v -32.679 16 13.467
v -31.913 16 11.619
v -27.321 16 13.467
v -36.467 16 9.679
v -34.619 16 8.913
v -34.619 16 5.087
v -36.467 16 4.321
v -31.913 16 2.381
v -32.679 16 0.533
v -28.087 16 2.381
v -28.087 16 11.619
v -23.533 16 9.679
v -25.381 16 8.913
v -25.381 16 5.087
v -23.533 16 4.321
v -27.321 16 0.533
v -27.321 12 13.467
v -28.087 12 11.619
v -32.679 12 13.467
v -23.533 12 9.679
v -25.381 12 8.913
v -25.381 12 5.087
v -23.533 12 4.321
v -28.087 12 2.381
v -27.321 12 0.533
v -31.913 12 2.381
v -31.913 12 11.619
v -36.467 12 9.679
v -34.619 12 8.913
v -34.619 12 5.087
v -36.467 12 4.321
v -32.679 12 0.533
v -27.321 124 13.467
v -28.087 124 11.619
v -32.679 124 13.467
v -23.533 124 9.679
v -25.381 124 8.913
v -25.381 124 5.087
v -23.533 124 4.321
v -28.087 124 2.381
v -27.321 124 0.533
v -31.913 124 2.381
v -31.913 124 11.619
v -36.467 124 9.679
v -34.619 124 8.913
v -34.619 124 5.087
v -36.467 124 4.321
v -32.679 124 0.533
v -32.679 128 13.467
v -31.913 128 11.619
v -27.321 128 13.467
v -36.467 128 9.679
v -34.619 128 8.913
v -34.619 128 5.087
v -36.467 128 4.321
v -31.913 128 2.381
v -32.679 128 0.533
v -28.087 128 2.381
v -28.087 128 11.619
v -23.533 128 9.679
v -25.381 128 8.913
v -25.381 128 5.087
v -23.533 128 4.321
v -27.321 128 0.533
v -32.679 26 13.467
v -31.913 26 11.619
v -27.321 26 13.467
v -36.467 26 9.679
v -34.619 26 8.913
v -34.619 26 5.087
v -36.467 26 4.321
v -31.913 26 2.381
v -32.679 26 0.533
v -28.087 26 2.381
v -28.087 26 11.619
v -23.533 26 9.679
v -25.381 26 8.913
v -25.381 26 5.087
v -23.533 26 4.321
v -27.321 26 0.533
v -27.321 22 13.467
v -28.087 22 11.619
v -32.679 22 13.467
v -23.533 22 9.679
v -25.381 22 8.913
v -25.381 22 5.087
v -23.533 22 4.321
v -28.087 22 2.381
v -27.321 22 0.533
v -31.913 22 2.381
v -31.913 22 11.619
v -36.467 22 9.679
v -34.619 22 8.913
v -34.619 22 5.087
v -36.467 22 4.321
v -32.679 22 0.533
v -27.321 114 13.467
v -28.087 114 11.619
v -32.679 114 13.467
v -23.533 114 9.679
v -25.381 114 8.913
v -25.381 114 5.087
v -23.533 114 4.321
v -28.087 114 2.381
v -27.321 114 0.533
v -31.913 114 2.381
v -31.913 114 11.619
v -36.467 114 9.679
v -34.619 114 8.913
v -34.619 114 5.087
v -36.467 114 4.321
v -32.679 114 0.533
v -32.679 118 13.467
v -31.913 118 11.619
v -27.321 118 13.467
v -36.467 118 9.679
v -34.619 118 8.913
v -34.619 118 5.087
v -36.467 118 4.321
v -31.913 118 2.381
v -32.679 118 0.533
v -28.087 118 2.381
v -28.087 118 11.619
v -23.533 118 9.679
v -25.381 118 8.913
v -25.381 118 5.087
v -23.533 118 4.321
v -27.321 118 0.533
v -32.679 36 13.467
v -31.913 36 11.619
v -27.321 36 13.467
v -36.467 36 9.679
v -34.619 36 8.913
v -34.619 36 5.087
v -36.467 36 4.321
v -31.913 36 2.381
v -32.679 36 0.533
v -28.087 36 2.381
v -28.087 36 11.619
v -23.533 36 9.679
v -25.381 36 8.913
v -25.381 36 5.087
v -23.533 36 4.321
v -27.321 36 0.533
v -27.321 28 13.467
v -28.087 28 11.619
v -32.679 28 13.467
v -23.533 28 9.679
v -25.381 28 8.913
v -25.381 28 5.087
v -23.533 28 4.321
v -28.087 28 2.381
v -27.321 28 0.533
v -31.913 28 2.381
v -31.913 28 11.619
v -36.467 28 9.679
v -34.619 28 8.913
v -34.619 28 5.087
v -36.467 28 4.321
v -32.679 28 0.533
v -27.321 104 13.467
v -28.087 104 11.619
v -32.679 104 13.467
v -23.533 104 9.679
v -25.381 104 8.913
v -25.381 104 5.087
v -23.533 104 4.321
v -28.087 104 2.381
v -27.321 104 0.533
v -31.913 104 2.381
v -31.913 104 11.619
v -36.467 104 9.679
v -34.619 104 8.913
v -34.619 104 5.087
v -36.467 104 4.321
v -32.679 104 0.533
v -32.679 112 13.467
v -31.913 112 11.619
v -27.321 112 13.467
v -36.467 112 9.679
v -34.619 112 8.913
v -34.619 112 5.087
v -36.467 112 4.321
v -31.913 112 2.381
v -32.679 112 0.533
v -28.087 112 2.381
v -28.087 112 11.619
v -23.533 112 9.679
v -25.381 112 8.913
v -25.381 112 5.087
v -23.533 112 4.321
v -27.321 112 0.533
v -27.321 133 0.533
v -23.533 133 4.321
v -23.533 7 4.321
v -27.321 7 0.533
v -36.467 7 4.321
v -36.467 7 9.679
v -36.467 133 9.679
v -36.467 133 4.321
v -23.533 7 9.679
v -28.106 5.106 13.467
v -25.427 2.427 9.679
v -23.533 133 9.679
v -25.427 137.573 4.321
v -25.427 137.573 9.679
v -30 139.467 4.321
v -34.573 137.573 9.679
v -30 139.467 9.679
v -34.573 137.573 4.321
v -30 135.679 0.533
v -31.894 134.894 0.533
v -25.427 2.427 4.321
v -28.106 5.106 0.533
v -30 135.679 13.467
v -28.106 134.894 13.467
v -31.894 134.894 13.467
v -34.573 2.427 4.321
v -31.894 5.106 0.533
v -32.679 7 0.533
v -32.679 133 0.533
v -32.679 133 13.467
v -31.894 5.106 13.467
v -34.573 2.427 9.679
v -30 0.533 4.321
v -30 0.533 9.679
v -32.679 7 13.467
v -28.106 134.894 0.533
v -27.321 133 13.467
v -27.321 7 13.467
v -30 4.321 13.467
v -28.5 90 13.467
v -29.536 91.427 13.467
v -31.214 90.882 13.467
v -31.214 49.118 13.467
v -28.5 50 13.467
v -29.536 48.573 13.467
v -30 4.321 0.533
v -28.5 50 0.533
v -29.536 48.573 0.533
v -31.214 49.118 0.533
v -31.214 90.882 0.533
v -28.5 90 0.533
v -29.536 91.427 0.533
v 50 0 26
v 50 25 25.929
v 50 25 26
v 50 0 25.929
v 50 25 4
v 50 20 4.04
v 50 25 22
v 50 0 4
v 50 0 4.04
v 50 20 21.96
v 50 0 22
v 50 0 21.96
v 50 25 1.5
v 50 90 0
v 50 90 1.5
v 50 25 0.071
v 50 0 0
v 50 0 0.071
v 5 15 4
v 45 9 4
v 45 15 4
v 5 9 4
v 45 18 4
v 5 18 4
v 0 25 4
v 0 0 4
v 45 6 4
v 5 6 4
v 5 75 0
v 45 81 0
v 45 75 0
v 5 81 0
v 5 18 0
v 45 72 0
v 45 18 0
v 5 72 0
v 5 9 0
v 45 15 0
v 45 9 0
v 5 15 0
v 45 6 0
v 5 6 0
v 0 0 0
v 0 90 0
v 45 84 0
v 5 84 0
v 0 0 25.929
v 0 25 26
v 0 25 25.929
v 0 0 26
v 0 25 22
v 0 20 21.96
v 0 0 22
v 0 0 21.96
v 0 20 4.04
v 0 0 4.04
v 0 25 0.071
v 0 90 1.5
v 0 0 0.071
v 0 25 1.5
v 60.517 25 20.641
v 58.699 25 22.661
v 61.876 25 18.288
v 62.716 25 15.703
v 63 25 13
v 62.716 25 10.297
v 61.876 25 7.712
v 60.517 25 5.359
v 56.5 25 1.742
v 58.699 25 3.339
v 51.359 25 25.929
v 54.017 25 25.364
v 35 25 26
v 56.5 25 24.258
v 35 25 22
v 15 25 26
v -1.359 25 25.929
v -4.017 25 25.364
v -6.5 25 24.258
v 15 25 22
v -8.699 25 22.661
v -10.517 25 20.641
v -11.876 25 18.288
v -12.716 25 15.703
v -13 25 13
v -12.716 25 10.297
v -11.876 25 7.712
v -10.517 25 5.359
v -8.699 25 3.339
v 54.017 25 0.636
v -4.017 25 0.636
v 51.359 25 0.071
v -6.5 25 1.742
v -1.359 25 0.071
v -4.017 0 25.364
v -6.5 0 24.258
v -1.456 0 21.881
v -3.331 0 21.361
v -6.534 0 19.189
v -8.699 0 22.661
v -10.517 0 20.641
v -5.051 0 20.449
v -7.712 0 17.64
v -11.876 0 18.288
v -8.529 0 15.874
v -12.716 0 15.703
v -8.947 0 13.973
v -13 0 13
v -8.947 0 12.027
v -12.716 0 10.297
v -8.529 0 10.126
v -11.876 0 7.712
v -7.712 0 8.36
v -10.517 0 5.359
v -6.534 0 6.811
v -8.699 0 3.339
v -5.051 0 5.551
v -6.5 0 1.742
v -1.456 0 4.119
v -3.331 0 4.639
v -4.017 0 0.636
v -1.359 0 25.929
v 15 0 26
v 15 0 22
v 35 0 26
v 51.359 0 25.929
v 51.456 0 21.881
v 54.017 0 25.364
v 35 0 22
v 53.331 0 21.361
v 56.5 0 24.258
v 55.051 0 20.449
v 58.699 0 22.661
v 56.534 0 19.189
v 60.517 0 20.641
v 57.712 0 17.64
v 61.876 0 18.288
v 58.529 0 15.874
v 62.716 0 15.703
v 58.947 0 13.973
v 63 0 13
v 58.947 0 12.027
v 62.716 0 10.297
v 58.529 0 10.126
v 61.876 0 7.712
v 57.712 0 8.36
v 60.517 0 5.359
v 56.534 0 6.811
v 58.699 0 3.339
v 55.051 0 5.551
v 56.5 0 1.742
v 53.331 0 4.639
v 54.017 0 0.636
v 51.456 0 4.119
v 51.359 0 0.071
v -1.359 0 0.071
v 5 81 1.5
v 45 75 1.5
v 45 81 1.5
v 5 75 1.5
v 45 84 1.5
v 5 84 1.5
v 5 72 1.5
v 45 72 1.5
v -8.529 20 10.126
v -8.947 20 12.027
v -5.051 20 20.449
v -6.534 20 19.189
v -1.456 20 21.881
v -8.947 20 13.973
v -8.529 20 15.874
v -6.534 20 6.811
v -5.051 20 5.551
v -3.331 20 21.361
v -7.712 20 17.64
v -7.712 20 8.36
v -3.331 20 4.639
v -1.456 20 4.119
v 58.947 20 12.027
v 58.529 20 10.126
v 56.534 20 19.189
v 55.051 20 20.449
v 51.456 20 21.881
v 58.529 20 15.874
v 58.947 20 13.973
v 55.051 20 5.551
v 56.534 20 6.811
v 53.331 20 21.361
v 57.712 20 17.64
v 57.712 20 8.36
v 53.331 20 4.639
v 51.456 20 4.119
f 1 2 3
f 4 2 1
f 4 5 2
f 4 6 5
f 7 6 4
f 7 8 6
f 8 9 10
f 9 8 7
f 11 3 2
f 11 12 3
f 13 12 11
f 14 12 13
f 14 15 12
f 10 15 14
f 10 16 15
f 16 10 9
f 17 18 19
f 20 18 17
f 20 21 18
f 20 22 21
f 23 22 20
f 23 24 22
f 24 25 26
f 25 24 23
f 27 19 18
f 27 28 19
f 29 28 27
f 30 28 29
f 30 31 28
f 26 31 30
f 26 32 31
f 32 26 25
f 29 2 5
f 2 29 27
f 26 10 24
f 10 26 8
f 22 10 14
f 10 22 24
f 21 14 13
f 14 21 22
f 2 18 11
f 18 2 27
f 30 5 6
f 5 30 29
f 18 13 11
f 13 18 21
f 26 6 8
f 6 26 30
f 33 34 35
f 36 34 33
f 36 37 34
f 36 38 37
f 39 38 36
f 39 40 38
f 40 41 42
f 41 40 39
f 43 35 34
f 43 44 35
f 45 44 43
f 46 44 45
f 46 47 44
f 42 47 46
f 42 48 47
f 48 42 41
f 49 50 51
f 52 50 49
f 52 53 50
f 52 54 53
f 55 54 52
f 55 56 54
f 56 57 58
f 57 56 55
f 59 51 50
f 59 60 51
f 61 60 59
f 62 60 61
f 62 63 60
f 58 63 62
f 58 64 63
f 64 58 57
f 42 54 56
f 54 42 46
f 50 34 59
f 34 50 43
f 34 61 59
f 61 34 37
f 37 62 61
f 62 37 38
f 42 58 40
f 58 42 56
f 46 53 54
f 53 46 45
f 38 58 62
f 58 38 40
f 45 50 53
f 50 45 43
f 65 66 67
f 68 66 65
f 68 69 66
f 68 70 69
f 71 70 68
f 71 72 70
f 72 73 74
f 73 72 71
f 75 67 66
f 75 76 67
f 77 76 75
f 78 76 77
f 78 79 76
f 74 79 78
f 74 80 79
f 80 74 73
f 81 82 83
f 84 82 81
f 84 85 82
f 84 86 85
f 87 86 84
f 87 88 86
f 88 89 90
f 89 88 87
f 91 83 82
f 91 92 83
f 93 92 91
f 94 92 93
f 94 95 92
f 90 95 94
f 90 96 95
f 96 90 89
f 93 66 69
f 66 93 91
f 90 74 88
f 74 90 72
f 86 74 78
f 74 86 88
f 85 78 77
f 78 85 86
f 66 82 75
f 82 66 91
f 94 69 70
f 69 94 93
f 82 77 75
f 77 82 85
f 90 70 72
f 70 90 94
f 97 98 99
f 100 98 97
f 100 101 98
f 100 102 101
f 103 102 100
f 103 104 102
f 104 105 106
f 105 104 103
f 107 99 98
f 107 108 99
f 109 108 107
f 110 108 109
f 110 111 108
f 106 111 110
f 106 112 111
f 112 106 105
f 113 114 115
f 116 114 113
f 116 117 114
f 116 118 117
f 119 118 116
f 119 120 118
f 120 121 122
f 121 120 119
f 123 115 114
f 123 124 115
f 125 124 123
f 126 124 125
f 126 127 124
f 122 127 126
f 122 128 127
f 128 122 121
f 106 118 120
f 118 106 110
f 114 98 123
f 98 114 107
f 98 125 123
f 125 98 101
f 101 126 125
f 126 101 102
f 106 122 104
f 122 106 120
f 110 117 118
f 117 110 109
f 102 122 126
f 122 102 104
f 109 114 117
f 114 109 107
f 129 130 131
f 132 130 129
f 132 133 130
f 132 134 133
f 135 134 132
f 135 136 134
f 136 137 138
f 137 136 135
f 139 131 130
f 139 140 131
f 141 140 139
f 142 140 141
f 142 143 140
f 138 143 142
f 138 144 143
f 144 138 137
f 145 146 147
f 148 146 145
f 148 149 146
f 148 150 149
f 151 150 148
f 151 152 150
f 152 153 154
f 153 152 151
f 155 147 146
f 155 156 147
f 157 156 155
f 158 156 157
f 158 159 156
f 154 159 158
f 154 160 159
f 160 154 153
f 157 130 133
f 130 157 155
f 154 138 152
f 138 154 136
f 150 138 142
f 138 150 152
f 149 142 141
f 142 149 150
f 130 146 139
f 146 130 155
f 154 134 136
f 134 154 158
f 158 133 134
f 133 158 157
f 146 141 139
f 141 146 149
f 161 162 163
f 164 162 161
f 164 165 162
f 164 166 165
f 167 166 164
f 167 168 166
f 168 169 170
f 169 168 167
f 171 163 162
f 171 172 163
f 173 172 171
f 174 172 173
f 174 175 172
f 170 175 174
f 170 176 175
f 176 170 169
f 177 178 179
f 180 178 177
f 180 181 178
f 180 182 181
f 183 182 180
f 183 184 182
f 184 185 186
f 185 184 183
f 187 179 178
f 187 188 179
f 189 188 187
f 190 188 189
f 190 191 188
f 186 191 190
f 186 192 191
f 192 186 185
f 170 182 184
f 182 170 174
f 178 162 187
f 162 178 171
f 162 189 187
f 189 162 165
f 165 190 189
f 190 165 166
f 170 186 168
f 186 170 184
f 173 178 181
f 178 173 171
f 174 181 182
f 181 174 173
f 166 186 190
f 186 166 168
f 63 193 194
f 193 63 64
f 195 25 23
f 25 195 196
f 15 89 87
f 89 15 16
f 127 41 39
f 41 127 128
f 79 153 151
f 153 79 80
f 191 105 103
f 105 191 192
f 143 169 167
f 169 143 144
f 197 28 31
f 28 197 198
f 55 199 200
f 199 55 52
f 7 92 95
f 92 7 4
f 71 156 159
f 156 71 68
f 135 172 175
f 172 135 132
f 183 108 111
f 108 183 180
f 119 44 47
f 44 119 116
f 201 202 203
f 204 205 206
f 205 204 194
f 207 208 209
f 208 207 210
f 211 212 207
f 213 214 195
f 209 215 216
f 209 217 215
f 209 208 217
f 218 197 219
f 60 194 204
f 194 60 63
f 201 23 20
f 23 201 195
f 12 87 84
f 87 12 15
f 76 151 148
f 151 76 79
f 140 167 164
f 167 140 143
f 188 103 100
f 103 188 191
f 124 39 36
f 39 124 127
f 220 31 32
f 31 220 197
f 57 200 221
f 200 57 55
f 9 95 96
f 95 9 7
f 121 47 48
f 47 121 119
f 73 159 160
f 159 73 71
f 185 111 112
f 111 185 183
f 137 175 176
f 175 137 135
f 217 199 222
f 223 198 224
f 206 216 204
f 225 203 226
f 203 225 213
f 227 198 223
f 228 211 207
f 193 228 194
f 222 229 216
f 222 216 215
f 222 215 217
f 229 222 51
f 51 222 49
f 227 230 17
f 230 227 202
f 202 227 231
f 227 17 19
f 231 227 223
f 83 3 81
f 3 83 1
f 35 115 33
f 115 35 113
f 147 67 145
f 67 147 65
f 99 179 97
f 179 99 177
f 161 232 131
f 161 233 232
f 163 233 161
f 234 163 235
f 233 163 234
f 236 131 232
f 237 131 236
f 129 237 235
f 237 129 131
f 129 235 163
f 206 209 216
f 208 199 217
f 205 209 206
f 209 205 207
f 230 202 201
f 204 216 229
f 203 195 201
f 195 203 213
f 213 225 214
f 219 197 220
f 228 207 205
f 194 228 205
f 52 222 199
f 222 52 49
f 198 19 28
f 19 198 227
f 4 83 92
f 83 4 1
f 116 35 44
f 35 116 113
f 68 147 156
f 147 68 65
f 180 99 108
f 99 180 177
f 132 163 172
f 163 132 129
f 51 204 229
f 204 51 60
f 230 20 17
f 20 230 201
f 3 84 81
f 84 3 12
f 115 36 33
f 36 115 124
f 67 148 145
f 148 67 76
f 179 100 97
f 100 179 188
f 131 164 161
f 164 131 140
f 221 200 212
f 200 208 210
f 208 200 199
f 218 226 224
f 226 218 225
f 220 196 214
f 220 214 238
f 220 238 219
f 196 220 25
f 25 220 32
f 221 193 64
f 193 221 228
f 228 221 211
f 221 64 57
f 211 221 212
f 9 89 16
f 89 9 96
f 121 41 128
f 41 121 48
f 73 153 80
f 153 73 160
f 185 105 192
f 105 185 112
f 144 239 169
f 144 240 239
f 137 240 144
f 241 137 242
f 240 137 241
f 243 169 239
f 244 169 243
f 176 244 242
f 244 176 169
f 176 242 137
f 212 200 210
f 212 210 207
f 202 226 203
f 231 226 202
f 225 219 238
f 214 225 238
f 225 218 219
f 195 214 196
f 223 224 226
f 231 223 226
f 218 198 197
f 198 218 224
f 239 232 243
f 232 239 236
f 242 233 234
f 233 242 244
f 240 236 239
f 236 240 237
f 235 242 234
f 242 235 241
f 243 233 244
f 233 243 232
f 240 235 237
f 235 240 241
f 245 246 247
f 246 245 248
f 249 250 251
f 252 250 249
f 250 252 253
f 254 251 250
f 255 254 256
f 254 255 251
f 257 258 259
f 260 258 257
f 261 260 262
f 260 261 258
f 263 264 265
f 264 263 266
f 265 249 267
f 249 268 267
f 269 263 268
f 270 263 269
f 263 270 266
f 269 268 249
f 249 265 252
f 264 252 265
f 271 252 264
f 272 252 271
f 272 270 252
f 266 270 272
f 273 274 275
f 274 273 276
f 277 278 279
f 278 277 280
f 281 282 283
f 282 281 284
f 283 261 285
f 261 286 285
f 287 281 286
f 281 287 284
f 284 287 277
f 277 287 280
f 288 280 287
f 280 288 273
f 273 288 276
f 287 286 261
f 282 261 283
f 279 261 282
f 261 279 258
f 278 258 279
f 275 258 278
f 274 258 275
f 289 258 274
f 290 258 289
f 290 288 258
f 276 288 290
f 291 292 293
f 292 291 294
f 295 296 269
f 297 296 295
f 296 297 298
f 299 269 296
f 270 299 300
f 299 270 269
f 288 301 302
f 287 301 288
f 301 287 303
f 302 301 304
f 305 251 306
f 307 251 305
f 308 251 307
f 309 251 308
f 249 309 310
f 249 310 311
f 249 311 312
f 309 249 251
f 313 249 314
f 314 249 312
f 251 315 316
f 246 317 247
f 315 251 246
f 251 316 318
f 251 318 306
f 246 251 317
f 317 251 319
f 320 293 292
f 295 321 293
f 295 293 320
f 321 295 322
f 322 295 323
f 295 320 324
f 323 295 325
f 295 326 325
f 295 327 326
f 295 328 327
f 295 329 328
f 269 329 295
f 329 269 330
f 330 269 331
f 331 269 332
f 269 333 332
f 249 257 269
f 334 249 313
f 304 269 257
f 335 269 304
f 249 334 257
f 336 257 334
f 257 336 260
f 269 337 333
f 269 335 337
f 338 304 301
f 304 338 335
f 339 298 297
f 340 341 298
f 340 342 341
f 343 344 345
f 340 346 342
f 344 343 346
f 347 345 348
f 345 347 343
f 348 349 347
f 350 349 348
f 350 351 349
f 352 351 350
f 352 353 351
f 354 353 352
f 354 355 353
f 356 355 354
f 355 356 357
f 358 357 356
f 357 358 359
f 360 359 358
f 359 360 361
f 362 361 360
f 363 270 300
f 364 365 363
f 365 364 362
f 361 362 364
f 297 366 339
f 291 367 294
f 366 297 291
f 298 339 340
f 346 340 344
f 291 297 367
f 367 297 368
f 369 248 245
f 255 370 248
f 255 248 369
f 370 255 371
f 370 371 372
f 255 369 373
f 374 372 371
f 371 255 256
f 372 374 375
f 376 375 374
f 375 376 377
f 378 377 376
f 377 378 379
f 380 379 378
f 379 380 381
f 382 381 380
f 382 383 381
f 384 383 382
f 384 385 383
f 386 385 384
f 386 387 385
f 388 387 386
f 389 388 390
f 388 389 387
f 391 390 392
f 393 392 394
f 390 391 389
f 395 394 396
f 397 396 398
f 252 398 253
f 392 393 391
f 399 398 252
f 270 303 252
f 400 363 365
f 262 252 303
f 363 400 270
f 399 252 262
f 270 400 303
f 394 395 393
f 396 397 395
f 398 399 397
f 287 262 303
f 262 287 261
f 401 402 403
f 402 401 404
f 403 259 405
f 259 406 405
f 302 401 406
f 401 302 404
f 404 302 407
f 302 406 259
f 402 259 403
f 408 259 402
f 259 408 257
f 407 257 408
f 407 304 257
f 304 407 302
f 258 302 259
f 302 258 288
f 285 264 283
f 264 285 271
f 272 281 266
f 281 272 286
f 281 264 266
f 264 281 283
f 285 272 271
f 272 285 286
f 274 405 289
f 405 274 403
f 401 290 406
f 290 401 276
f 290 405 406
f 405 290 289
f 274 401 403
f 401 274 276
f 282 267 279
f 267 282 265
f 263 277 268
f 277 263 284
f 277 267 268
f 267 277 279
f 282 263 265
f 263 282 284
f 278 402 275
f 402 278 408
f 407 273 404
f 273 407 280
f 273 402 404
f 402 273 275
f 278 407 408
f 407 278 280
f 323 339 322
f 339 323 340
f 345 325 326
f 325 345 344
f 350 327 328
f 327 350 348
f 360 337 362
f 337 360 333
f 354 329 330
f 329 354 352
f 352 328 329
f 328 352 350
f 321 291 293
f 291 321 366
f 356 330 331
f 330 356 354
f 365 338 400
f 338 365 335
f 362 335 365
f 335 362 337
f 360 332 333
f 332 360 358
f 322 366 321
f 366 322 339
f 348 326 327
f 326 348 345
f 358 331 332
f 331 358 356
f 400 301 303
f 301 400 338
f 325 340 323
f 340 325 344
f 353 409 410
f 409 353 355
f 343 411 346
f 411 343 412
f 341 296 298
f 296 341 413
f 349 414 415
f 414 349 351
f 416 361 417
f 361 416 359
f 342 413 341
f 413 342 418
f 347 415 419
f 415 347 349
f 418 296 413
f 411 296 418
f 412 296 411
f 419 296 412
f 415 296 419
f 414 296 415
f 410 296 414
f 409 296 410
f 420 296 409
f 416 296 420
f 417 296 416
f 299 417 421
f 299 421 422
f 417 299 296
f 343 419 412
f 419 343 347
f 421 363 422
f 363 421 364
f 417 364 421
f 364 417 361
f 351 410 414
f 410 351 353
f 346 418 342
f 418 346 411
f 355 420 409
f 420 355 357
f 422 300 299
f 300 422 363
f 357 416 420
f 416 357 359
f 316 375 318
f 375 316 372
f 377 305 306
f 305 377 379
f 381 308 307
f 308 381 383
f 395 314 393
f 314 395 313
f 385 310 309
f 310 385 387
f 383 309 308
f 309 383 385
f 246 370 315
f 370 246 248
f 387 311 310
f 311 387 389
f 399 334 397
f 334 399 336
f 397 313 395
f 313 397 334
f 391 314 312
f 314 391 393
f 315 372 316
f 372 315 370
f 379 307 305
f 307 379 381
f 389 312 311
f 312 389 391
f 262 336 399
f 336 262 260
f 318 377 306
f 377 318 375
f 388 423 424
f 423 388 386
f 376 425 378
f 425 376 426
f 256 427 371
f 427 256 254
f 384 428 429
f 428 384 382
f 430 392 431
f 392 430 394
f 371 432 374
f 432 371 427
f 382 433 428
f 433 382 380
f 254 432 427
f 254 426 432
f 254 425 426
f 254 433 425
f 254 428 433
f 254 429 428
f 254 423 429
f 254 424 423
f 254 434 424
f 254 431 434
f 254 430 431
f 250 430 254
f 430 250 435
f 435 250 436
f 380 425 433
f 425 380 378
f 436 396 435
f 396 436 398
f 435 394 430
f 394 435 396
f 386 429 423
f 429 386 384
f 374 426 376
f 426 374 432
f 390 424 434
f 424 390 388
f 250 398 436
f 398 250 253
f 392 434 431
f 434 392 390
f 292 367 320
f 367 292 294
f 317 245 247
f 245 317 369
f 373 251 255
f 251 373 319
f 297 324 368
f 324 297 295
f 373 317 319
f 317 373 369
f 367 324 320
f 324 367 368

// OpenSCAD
rod_r=7;//rod radius mm
rod_l=140;//rod length mm
rod_g=5;//rod groove radius
rod_res=8;//rod resolution

rod_groove_l=[4,4,8];//
rod_groove_p=[12,22,28];//

rod_in_strap_space=2;//spacing between rod and the curve
strap_holder_w=50;//strap holder width
strap_holder_t=1.5;//strap holder thickness
strap_holder_l=90;//strap holder length
holder_w=25;//curvy holder width
strap_w=40;// velcro strap width
strap_t=3;//velcro strap groove thickness
curve_sup_t=5;//groove support thichness
curve_t=4;//curve thickness

groov_p_y=[6,15];//y-position of strap grooves 

groov_array_length=2;//length of grooves y-position array 
curve_op=20;//curve upper openning window width 

//calculations
groov_p_x=(strap_holder_w-strap_w)/2;

curve_or=rod_r+rod_in_strap_space+curve_t; //curve outer radius
curve_ir=rod_r+rod_in_strap_space; //curve inner radius
window_y_p=(strap_holder_w-curve_op)/2;//y-position of window






///////////////////////////////////////////
//////////////////////////////////////////

module strap_holder(){
difference(){
union(){
cube([strap_holder_w,holder_w,curve_t]);
cube([strap_holder_w,strap_holder_l,strap_holder_t]);
}
for(i=[0:1:groov_array_length-1]){
translate([groov_p_x,groov_p_y[i],0])cube([strap_w,strap_t,curve_t]);
  translate([groov_p_x,strap_holder_l-strap_t-groov_p_y[i],0])cube([strap_w,strap_t,curve_t]);  
}   

}
//curve building
difference(){
translate([0,0,curve_or])rotate([-90,0,0])difference(){cylinder(r=curve_or,h=holder_w);
    translate([0,0,-curve_sup_t])cylinder(r=curve_ir,h=holder_w);
    
}
    translate([0,-.1,0])cube(300);
}

translate([strap_holder_w,0,0])mirror([1,0,0])
difference(){
translate([0,0,curve_or])rotate([-90,0,0])difference(){cylinder(r=curve_or,h=holder_w);
    translate([0,0,-curve_sup_t])cylinder(r=curve_ir,h=holder_w);
    
}
    translate([0,-.1,0])cube(300);
}
difference(){
translate([0,0,curve_or+curve_ir])cube([strap_holder_w,holder_w,curve_t]);
translate([window_y_p,0,curve_or+curve_ir])cube([curve_op,holder_w,curve_t]);
}
}
///////////////////////////////////



module rod(){
difference(){
hull(){
translate([0,rod_r,rod_r])sphere(r=rod_r,$fn=rod_res);
translate([0,rod_l-rod_r,rod_r])sphere(r=rod_r,$fn=rod_res);
}
//
hull(){
translate([0,(-strap_w+rod_l)/2,0])cylinder(r=strap_t/2,h=rod_r*2);
translate([0,(strap_w+rod_l)/2,0])cylinder(r=strap_t/2,h=rod_r*2);
}


for(i=[0:1:2]){
translate([0,rod_groove_p[i],rod_r])rotate([-90,0,0])rotate([0,0,22.5])difference(){cylinder(r=rod_r+1,h=rod_groove_l[i],$fn=rod_res);cylinder(r=rod_g,h=rod_groove_l[i],$fn=rod_res);
}
translate([0,rod_l-rod_groove_p[i],rod_r])rotate([90,0,0])rotate([0,0,22.5])difference(){cylinder(r=rod_r+1,h=rod_groove_l[i],$fn=rod_res);cylinder(r=rod_g,h=rod_groove_l[i],$fn=rod_res);
    
    
}

}
}
}
translate([-30,0,0])rod();
strap_holder();
